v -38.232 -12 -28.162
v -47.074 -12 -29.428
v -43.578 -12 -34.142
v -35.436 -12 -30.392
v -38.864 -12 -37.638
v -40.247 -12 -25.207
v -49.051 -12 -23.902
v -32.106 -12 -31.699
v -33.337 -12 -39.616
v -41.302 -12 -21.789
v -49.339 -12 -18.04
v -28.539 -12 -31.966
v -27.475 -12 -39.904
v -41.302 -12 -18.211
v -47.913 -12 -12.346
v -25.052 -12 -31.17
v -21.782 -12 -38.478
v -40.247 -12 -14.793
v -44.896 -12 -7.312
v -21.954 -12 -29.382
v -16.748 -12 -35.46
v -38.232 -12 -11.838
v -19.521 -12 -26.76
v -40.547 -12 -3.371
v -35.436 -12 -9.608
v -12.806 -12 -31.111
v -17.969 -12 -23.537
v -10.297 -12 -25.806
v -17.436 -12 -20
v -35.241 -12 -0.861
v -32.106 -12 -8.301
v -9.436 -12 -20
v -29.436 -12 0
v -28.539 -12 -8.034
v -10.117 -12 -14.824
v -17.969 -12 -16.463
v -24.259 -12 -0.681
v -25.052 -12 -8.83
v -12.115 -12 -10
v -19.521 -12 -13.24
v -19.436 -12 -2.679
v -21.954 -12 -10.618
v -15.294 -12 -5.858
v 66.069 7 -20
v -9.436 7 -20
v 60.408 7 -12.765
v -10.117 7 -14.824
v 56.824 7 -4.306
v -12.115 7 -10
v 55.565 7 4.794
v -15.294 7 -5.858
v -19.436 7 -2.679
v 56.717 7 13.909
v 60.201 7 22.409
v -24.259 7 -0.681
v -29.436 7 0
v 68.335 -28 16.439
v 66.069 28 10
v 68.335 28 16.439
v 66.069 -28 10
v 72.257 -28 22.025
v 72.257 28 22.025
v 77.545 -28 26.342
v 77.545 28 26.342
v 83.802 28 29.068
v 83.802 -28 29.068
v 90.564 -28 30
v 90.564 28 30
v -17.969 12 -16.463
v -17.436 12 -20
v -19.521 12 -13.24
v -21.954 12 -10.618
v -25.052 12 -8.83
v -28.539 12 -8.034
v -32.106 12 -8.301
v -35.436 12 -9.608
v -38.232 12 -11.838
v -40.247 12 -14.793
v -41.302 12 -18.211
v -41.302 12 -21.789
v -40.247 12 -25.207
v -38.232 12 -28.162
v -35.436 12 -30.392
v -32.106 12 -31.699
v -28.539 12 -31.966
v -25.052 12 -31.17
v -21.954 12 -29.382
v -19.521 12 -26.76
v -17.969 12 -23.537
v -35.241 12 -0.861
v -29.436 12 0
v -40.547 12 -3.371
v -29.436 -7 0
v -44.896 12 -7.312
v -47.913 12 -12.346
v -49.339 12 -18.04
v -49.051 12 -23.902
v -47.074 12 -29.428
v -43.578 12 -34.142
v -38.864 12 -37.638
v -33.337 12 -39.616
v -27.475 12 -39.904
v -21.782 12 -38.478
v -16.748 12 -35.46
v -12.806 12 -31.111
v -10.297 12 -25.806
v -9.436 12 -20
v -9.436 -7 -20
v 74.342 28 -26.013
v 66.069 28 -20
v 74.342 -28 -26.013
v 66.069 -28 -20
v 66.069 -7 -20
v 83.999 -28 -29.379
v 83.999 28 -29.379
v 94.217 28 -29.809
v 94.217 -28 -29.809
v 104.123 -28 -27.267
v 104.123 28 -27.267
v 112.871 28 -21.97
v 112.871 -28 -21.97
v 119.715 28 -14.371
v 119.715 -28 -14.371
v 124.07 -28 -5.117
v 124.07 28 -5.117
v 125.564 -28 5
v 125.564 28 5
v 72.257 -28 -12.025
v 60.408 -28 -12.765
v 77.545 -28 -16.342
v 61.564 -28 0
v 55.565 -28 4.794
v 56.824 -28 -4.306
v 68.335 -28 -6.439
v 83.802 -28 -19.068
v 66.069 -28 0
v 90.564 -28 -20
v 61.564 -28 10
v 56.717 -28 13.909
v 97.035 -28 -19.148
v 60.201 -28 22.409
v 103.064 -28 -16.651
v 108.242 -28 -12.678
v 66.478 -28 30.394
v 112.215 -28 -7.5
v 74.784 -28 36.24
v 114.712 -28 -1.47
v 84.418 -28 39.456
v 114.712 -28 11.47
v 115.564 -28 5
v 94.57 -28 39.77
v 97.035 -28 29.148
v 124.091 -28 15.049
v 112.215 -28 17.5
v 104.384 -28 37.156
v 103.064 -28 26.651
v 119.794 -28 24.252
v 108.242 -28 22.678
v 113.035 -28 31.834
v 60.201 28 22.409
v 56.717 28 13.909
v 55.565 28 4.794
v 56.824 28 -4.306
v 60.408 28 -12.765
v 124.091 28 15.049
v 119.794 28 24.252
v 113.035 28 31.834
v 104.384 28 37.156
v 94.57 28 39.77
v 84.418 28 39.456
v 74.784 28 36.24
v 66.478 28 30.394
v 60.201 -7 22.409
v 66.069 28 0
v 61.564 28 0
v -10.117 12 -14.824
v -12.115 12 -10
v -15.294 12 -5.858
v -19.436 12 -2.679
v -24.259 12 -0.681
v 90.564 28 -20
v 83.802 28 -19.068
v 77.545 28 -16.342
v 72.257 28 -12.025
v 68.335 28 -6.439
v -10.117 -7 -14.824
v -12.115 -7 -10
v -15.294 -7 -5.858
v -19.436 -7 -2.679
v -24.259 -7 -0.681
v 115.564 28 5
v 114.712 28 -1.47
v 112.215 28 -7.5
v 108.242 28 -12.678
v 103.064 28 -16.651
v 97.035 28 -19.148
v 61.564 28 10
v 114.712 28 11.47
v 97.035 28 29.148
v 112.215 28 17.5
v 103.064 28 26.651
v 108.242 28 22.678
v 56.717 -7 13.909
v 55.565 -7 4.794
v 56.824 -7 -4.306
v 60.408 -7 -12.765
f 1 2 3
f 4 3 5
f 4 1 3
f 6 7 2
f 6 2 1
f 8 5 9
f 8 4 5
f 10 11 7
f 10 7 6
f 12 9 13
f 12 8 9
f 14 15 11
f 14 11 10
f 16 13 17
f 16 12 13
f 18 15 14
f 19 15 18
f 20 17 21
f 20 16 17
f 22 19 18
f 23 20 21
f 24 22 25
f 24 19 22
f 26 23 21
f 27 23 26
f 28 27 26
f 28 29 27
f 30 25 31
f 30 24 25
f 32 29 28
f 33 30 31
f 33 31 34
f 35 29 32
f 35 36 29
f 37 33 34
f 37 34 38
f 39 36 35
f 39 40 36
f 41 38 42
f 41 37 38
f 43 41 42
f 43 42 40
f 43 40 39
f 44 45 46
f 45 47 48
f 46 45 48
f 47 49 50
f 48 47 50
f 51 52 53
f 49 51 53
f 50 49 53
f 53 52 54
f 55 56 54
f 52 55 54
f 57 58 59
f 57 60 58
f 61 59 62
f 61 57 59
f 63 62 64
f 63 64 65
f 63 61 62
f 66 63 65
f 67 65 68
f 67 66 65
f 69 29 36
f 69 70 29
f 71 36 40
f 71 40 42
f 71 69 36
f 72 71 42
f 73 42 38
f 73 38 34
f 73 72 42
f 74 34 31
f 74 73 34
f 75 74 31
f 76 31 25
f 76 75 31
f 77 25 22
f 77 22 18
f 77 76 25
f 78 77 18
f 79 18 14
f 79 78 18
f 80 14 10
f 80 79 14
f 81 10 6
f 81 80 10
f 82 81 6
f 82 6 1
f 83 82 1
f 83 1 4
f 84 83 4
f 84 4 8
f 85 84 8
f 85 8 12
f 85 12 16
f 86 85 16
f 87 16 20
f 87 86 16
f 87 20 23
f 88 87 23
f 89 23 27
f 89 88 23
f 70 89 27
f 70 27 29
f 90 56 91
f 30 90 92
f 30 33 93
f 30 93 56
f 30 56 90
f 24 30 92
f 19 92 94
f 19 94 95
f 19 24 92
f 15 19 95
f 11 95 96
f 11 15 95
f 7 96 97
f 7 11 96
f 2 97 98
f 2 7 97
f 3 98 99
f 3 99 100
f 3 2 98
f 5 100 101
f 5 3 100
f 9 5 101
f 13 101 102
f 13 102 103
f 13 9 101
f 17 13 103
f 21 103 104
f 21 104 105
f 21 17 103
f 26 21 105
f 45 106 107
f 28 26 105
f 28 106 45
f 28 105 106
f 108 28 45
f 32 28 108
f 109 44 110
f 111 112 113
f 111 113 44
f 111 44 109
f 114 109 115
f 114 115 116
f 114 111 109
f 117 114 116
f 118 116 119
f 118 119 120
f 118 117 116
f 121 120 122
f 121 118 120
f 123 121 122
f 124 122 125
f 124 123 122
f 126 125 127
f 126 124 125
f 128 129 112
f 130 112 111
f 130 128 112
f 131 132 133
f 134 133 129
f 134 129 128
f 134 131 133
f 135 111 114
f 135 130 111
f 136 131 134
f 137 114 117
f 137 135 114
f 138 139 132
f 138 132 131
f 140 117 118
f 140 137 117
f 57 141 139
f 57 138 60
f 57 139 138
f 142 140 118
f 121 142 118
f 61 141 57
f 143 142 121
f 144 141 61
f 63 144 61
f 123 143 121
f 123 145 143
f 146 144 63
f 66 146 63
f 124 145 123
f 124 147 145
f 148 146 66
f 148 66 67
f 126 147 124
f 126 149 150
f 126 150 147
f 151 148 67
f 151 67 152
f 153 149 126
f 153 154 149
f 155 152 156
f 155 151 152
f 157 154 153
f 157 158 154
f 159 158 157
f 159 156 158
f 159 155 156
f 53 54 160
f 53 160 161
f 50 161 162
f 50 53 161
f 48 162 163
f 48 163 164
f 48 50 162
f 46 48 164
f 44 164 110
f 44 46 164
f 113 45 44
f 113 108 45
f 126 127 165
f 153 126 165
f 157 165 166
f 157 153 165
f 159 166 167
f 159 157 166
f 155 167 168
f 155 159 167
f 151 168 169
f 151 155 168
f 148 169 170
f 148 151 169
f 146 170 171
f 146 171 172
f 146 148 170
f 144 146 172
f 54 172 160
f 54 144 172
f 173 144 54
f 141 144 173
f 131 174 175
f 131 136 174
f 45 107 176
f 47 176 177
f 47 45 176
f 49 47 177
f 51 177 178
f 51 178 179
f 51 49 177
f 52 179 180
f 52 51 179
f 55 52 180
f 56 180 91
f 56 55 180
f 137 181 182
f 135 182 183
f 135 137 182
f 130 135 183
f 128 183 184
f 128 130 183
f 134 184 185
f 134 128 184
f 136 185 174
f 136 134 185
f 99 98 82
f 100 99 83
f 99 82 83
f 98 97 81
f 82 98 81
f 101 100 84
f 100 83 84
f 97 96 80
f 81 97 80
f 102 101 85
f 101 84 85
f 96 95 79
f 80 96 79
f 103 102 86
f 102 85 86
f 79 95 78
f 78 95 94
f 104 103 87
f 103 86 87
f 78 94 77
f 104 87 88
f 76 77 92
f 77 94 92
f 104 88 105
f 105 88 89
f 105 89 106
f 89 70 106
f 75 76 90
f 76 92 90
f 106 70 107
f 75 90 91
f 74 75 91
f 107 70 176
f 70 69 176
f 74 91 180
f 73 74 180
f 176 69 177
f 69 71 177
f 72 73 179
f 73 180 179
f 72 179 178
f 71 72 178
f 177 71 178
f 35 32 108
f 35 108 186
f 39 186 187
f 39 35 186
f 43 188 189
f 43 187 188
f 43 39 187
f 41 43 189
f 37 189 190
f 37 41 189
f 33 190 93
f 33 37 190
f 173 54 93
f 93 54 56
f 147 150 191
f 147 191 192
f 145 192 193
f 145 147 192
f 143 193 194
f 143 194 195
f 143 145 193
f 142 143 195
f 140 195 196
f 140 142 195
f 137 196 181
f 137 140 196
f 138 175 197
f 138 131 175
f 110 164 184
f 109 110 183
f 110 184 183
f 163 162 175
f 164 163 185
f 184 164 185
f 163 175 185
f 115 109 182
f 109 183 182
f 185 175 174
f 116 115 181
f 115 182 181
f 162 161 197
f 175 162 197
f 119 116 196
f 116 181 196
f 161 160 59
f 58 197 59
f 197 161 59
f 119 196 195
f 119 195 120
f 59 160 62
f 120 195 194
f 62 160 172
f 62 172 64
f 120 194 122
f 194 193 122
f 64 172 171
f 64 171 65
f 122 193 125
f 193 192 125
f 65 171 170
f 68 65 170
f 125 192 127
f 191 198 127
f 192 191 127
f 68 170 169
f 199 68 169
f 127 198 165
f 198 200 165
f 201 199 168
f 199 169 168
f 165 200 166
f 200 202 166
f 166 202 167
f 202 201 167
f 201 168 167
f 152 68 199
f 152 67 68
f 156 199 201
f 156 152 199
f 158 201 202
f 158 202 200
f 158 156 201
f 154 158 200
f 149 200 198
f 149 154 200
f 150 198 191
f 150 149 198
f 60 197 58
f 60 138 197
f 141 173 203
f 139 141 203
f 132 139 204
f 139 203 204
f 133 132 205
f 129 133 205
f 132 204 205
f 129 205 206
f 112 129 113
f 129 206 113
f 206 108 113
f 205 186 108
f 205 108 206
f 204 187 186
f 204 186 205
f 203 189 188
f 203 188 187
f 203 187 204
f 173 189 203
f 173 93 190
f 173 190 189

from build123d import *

# Parameters (mm, degrees)
F0_R          = 12
F1_DEPTH      = 12
F1_DEPTH_BACK = 12
F2_DEPTH      = 7
F2_DEPTH_BACK = 7
F3_DEPTH      = 28
F3_DEPTH_BACK = 28


with BuildPart() as f1:
    # F0 (on Front) → F1 (new body, two sides)
    with BuildSketch(Plane.XZ) as f1_sk:
        with BuildLine():
            ThreePointArc((-29.435681, 0), (-43.577817, -34.142136), (-9.435681, -20))
            ThreePointArc((-9.435681, -20), (-15.293546, -5.857864), (-29.435681, 0))
        make_face()
        with Locations((-29.435681, -20)):
            Circle(F0_R, mode=Mode.SUBTRACT)
    extrude(amount=F1_DEPTH)
    extrude(f1_sk.sketch, amount=-F1_DEPTH_BACK)

    # F0 (on Front) → F2 (join, two sides)
    with BuildSketch(Plane.XZ) as f2_sk:
        with BuildLine():
            ThreePointArc((-29.435681, 0), (-15.293546, -5.857864), (-9.435681, -20))
            Line((-9.435681, -20), (66.069421, -20))
            ThreePointArc((66.069421, -20), (55.894649, 0.20271), (60.201199, 22.40922))
            Line((60.201199, 22.40922), (-29.435681, 0))
        make_face()
    extrude(amount=F2_DEPTH)
    extrude(f2_sk.sketch, amount=-F2_DEPTH_BACK)

    # F0 (on Front) → F3 (join, two sides)
    with BuildSketch(Plane.XZ) as f3_sk:
        with BuildLine():
            ThreePointArc((60.201199, 22.40922), (55.894649, 0.20271), (66.069421, -20))
            ThreePointArc((66.069421, -20), (104.123054, -27.267022), (125.564319, 5))
            ThreePointArc((125.564319, 5), (99.572393, 38.82092), (60.201199, 22.40922))
        make_face()
        with BuildLine():
            ThreePointArc((115.564319, 5), (108.241988, -12.67767), (90.564319, -20))
            ThreePointArc((90.564319, -20), (74.752931, -14.364917), (66.069421, 0))
            Line((66.069421, 0), (61.564319, 0))
            Line((61.564319, 0), (61.564319, 5))
            Line((61.564319, 5), (61.564319, 10))
            Line((61.564319, 10), (66.069421, 10))
            ThreePointArc((66.069421, 10), (74.752931, 24.364917), (90.564319, 30))
            ThreePointArc((90.564319, 30), (108.241988, 22.67767), (115.564319, 5))
        make_face(mode=Mode.SUBTRACT)
    extrude(amount=F3_DEPTH)
    extrude(f3_sk.sketch, amount=-F3_DEPTH_BACK)


solid = f1.part
